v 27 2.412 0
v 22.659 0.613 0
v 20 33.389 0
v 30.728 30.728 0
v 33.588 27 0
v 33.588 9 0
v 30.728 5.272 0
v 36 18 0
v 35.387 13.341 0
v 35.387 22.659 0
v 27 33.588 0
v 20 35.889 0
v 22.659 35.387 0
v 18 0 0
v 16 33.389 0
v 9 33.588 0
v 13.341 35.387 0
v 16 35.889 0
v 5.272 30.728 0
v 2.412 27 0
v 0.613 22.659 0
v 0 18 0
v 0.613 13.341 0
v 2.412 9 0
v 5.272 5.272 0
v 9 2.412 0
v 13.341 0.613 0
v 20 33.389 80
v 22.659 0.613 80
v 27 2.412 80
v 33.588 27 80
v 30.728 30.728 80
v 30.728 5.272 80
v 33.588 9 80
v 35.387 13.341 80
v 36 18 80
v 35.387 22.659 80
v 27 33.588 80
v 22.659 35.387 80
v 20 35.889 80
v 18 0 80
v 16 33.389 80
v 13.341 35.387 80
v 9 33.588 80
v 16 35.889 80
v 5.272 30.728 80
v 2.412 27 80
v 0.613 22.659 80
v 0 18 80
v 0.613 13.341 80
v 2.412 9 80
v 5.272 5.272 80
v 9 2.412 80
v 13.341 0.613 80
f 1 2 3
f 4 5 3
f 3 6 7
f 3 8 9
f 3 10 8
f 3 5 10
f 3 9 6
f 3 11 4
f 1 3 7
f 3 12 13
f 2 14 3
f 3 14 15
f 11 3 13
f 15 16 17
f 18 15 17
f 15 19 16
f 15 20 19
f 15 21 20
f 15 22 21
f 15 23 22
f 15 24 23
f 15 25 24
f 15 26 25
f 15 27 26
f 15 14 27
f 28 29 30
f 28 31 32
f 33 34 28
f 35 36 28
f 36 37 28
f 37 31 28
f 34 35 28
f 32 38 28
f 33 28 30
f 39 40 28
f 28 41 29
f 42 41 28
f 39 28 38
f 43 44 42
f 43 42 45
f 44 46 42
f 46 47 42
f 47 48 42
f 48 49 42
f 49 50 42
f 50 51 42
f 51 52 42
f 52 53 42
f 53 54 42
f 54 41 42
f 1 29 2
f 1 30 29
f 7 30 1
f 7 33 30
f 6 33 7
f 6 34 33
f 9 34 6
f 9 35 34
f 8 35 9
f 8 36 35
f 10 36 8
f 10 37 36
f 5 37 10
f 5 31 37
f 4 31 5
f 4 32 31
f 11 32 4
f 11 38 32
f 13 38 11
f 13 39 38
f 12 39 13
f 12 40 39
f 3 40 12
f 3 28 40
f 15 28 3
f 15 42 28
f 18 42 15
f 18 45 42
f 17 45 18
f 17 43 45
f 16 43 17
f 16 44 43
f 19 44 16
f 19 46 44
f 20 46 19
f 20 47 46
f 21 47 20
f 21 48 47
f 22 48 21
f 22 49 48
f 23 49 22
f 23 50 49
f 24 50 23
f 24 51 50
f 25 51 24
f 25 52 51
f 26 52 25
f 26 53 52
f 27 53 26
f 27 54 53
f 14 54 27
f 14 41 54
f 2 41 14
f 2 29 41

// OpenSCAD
$fn = 32;

// ----------------------------------------------------------------------
// Keyway shaft: d36 shaft, key 4 x 2.5 mm
// ----------------------------------------------------------------------

// --- parameters (mm) ---
shaft_r = 18;             // shaft radius
key_w = 4;                // keyway width
key_d = 2.5;              // keyway depth below the surface line
plate_t = 80;             // shaft length, Z (extrusion height)
fit_tol = 0.1;            // declared fit tolerance (prompt contract)
free_tol = 0.5;           // declared free tolerance (prompt contract)

shaft_d = 2 * shaft_r;  // shaft diameter
circle_step = 15;  // polygon sampling step, degrees

profile = [[13.341, 35.387], [9, 33.588], [5.272, 30.728], [2.412, 27], [0.613, 22.659], [0, 18], [0.613, 13.341], [2.412, 9], [5.272, 5.272], [9, 2.412], [13.341, 0.613], [18, 0], [22.659, 0.613], [27, 2.412], [30.728, 5.272], [33.588, 9], [35.387, 13.341], [36, 18], [35.387, 22.659], [33.588, 27], [30.728, 30.728], [27, 33.588], [22.659, 35.387], [20, 35.889], [20, 33.389], [16, 33.389], [16, 35.889]];  // primary outline, 27 points, counter clockwise

// --- the one profile operation ---
linear_extrude(height = plate_t) polygon(points = profile);
